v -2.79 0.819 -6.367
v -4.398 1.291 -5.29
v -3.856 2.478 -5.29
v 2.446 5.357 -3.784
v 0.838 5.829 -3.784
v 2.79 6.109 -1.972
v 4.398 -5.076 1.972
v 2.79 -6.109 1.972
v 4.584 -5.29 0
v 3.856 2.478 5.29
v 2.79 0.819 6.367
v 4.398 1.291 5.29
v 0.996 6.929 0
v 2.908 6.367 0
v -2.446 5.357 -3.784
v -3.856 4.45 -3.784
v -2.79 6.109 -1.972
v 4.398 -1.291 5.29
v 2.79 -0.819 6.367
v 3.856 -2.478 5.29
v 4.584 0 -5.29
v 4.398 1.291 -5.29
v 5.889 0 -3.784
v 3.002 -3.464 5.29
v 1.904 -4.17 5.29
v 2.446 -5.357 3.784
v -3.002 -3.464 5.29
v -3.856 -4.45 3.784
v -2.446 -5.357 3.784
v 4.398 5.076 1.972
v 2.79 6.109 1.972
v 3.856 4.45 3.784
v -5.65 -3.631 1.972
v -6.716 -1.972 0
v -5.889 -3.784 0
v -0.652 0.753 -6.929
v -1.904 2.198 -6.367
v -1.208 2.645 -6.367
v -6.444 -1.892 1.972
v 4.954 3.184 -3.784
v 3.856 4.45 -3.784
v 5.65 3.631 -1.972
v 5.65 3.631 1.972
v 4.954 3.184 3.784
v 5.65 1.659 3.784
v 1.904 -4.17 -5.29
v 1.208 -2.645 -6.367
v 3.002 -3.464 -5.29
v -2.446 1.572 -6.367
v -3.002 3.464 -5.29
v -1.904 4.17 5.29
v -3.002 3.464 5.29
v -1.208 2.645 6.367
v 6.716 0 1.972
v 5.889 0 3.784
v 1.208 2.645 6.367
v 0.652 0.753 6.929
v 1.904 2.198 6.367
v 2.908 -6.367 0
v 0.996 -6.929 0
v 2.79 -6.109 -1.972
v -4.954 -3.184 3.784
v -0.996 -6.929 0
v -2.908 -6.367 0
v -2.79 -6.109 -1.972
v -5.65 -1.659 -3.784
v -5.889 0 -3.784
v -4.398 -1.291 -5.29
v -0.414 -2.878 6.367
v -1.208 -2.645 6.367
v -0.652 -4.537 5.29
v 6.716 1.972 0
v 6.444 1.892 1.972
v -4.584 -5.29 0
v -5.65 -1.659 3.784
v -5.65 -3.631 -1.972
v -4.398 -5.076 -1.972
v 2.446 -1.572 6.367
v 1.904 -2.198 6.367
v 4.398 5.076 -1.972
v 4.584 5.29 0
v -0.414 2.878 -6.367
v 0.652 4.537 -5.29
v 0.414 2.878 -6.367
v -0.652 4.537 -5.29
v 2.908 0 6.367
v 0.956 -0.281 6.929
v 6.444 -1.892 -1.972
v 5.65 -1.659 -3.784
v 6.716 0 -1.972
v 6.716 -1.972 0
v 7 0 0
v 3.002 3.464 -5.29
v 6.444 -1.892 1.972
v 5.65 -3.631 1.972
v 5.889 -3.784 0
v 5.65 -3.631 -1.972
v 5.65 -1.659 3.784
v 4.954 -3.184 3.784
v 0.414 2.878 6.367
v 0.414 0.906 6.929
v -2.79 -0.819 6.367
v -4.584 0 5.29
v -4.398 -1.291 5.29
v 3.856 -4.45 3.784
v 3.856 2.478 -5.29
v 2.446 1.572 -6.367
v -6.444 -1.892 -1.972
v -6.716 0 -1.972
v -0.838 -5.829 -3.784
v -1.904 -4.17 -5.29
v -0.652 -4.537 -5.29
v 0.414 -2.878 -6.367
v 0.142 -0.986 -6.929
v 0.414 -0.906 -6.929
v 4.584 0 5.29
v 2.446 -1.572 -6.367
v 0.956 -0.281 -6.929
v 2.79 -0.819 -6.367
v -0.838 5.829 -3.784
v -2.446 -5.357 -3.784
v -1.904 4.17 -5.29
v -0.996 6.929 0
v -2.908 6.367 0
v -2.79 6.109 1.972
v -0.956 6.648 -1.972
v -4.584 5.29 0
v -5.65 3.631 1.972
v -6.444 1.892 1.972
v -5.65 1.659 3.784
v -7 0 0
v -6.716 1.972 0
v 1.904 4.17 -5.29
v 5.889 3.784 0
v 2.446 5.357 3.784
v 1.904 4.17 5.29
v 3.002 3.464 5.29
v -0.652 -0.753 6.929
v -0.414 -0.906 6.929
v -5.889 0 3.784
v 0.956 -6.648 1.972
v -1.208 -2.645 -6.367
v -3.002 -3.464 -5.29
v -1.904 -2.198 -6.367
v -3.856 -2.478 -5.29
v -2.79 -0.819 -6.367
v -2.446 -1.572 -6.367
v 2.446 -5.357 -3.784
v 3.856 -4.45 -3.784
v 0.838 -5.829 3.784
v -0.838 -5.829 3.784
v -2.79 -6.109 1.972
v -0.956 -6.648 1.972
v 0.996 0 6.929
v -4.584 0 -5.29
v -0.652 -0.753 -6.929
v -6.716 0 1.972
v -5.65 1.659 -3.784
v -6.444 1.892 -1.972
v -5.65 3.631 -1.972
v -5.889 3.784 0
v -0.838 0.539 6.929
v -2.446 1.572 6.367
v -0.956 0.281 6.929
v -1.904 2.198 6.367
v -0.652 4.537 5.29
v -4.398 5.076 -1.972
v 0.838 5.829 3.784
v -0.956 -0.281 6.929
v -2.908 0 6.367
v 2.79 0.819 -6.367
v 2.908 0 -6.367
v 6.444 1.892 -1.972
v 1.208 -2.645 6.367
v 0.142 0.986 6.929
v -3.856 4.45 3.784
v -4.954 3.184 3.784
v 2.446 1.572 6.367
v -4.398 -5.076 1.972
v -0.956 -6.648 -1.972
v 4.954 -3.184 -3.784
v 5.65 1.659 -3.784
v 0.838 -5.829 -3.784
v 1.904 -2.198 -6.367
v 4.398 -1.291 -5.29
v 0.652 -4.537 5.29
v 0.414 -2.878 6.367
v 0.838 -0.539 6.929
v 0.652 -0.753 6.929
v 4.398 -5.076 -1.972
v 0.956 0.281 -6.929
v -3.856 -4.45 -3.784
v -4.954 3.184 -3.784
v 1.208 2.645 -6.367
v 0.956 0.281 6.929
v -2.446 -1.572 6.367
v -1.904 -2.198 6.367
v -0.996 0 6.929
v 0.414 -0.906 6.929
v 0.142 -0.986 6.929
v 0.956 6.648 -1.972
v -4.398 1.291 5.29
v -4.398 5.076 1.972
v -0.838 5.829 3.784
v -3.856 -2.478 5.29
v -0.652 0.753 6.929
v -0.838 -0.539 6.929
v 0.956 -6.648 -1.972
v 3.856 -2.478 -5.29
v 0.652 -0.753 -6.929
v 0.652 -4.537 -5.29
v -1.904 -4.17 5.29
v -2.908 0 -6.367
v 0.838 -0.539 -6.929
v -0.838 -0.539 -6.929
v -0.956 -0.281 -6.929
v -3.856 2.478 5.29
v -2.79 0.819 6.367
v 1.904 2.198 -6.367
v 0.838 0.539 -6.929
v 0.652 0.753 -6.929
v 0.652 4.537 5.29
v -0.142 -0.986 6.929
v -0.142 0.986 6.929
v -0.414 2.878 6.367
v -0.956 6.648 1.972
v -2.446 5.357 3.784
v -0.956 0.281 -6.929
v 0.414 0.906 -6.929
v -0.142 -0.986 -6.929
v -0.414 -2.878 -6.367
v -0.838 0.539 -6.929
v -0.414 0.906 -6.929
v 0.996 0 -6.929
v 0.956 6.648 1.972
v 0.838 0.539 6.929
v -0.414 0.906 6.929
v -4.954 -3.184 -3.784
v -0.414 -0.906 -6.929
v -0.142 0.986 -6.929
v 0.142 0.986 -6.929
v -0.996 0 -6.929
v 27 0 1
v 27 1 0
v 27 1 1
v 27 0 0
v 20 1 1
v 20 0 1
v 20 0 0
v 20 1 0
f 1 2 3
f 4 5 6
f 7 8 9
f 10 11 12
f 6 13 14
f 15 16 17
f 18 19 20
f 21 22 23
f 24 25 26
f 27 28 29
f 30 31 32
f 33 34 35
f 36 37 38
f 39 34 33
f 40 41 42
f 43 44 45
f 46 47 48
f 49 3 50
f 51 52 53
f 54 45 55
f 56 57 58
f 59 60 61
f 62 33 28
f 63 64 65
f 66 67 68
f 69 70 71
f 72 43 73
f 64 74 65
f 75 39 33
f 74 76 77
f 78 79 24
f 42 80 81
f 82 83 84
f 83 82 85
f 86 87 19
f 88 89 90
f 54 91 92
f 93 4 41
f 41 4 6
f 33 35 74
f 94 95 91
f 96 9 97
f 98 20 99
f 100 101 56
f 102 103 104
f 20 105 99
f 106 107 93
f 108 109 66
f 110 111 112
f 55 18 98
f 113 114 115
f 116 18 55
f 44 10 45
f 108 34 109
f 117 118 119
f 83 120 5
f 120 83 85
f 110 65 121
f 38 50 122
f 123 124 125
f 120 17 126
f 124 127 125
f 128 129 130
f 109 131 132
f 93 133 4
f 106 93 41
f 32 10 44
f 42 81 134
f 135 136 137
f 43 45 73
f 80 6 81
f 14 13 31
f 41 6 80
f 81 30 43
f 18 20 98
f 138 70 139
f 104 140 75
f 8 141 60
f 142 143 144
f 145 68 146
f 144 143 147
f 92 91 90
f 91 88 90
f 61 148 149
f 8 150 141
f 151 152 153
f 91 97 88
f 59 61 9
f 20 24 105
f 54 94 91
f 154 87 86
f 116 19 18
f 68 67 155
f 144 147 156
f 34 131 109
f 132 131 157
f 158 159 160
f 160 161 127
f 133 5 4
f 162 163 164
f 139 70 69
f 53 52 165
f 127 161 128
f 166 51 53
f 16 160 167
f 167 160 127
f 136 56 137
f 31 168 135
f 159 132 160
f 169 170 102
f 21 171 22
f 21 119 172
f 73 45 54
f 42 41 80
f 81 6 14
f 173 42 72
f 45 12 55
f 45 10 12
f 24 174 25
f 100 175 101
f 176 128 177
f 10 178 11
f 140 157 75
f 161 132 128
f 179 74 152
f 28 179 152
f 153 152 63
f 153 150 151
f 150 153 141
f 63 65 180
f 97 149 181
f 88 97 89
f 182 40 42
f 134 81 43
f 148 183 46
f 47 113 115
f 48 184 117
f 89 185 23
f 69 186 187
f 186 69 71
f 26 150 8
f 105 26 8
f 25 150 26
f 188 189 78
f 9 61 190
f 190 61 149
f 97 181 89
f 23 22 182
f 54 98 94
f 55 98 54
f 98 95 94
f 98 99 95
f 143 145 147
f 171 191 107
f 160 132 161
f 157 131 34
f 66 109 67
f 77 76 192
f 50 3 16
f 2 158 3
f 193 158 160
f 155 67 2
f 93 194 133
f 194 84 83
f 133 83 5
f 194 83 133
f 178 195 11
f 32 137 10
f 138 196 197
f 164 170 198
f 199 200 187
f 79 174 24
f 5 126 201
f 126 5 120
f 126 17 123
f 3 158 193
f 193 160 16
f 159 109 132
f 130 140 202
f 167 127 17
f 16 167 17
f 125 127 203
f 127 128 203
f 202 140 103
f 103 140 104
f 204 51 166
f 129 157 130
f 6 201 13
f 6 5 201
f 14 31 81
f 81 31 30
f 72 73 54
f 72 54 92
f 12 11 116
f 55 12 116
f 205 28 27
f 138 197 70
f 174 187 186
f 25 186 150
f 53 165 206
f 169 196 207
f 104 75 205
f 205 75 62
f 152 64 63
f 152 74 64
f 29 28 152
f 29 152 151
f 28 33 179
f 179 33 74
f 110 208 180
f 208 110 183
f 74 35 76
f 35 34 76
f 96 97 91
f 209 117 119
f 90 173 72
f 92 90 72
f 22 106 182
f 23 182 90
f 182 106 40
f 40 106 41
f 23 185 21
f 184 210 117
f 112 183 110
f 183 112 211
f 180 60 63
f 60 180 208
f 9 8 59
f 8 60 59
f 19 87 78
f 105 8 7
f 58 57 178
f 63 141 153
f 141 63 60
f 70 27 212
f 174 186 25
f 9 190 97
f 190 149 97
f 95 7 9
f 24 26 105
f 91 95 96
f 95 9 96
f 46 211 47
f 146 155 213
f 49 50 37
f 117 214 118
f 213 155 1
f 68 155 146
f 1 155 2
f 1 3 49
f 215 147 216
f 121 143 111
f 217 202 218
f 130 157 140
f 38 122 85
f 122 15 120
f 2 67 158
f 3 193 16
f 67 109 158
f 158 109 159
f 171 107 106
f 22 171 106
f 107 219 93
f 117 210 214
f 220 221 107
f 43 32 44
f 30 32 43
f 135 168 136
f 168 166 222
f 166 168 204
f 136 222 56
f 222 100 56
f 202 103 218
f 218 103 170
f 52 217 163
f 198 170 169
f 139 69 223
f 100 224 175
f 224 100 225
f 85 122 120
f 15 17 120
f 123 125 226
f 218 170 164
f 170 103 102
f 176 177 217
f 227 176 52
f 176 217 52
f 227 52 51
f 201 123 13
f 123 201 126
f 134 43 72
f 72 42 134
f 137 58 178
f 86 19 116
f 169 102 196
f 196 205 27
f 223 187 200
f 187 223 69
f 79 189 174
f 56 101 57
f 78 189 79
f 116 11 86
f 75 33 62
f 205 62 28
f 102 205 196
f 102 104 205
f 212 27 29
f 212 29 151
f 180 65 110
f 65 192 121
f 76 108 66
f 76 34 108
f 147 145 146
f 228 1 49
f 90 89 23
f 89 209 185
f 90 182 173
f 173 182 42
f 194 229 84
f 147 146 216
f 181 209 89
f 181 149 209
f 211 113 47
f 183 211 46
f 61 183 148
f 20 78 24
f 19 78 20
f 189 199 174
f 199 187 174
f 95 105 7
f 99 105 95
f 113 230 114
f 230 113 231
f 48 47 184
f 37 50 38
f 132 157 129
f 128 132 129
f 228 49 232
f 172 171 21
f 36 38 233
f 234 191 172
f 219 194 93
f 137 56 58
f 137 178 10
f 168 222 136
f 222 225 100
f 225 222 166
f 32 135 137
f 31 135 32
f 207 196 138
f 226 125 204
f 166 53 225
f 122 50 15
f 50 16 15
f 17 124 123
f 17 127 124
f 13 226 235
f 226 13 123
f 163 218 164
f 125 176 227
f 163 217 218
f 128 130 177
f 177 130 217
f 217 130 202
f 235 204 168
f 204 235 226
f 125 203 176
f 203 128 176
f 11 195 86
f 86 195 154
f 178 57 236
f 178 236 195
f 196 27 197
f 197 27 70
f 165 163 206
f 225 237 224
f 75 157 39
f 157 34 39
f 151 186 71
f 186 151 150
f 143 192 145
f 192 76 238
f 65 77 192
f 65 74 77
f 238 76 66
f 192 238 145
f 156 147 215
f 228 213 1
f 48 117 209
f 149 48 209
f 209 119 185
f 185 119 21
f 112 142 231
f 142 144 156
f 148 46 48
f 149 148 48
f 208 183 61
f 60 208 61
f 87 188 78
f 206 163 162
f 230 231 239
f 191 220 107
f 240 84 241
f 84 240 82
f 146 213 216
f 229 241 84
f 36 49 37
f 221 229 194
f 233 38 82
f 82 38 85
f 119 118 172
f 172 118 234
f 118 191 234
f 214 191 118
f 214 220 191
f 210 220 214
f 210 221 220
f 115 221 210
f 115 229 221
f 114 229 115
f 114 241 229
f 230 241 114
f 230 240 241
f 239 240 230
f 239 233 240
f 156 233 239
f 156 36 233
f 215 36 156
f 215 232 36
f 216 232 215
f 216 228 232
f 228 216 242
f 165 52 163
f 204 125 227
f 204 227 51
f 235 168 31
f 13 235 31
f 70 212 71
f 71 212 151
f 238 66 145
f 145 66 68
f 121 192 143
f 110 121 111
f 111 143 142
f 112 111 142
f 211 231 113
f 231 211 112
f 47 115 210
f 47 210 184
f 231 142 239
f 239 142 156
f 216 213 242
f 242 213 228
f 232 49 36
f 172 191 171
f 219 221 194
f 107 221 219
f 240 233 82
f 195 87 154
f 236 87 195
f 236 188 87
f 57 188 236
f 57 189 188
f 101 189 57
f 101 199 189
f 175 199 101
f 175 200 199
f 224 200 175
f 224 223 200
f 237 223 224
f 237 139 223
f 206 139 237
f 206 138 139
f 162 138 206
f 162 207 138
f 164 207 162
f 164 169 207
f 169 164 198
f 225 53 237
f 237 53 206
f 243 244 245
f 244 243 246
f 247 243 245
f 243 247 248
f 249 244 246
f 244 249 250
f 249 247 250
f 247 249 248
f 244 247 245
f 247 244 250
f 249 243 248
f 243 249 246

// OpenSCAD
// file: lib.scad
// V-002 library: lib_size() must read THIS file's LIB_UNIT (7), not the consumer's (99).
LIB_UNIT = 7;
function lib_size() = LIB_UNIT;
module lib_ball() { sphere(r = lib_size()); }
// main file
// V-002 — Integration Verification Backlog V2: a use'd definition sees its own file's
// constants, and the using file cannot override them. lib_size() must evaluate to 7
// (lib.scad's LIB_UNIT), never 99, on both the original and the bundle.
use <lib.scad>

LIB_UNIT = 99;

lib_ball();
translate([20, 0, 0]) cube([lib_size(), 1, 1]);
